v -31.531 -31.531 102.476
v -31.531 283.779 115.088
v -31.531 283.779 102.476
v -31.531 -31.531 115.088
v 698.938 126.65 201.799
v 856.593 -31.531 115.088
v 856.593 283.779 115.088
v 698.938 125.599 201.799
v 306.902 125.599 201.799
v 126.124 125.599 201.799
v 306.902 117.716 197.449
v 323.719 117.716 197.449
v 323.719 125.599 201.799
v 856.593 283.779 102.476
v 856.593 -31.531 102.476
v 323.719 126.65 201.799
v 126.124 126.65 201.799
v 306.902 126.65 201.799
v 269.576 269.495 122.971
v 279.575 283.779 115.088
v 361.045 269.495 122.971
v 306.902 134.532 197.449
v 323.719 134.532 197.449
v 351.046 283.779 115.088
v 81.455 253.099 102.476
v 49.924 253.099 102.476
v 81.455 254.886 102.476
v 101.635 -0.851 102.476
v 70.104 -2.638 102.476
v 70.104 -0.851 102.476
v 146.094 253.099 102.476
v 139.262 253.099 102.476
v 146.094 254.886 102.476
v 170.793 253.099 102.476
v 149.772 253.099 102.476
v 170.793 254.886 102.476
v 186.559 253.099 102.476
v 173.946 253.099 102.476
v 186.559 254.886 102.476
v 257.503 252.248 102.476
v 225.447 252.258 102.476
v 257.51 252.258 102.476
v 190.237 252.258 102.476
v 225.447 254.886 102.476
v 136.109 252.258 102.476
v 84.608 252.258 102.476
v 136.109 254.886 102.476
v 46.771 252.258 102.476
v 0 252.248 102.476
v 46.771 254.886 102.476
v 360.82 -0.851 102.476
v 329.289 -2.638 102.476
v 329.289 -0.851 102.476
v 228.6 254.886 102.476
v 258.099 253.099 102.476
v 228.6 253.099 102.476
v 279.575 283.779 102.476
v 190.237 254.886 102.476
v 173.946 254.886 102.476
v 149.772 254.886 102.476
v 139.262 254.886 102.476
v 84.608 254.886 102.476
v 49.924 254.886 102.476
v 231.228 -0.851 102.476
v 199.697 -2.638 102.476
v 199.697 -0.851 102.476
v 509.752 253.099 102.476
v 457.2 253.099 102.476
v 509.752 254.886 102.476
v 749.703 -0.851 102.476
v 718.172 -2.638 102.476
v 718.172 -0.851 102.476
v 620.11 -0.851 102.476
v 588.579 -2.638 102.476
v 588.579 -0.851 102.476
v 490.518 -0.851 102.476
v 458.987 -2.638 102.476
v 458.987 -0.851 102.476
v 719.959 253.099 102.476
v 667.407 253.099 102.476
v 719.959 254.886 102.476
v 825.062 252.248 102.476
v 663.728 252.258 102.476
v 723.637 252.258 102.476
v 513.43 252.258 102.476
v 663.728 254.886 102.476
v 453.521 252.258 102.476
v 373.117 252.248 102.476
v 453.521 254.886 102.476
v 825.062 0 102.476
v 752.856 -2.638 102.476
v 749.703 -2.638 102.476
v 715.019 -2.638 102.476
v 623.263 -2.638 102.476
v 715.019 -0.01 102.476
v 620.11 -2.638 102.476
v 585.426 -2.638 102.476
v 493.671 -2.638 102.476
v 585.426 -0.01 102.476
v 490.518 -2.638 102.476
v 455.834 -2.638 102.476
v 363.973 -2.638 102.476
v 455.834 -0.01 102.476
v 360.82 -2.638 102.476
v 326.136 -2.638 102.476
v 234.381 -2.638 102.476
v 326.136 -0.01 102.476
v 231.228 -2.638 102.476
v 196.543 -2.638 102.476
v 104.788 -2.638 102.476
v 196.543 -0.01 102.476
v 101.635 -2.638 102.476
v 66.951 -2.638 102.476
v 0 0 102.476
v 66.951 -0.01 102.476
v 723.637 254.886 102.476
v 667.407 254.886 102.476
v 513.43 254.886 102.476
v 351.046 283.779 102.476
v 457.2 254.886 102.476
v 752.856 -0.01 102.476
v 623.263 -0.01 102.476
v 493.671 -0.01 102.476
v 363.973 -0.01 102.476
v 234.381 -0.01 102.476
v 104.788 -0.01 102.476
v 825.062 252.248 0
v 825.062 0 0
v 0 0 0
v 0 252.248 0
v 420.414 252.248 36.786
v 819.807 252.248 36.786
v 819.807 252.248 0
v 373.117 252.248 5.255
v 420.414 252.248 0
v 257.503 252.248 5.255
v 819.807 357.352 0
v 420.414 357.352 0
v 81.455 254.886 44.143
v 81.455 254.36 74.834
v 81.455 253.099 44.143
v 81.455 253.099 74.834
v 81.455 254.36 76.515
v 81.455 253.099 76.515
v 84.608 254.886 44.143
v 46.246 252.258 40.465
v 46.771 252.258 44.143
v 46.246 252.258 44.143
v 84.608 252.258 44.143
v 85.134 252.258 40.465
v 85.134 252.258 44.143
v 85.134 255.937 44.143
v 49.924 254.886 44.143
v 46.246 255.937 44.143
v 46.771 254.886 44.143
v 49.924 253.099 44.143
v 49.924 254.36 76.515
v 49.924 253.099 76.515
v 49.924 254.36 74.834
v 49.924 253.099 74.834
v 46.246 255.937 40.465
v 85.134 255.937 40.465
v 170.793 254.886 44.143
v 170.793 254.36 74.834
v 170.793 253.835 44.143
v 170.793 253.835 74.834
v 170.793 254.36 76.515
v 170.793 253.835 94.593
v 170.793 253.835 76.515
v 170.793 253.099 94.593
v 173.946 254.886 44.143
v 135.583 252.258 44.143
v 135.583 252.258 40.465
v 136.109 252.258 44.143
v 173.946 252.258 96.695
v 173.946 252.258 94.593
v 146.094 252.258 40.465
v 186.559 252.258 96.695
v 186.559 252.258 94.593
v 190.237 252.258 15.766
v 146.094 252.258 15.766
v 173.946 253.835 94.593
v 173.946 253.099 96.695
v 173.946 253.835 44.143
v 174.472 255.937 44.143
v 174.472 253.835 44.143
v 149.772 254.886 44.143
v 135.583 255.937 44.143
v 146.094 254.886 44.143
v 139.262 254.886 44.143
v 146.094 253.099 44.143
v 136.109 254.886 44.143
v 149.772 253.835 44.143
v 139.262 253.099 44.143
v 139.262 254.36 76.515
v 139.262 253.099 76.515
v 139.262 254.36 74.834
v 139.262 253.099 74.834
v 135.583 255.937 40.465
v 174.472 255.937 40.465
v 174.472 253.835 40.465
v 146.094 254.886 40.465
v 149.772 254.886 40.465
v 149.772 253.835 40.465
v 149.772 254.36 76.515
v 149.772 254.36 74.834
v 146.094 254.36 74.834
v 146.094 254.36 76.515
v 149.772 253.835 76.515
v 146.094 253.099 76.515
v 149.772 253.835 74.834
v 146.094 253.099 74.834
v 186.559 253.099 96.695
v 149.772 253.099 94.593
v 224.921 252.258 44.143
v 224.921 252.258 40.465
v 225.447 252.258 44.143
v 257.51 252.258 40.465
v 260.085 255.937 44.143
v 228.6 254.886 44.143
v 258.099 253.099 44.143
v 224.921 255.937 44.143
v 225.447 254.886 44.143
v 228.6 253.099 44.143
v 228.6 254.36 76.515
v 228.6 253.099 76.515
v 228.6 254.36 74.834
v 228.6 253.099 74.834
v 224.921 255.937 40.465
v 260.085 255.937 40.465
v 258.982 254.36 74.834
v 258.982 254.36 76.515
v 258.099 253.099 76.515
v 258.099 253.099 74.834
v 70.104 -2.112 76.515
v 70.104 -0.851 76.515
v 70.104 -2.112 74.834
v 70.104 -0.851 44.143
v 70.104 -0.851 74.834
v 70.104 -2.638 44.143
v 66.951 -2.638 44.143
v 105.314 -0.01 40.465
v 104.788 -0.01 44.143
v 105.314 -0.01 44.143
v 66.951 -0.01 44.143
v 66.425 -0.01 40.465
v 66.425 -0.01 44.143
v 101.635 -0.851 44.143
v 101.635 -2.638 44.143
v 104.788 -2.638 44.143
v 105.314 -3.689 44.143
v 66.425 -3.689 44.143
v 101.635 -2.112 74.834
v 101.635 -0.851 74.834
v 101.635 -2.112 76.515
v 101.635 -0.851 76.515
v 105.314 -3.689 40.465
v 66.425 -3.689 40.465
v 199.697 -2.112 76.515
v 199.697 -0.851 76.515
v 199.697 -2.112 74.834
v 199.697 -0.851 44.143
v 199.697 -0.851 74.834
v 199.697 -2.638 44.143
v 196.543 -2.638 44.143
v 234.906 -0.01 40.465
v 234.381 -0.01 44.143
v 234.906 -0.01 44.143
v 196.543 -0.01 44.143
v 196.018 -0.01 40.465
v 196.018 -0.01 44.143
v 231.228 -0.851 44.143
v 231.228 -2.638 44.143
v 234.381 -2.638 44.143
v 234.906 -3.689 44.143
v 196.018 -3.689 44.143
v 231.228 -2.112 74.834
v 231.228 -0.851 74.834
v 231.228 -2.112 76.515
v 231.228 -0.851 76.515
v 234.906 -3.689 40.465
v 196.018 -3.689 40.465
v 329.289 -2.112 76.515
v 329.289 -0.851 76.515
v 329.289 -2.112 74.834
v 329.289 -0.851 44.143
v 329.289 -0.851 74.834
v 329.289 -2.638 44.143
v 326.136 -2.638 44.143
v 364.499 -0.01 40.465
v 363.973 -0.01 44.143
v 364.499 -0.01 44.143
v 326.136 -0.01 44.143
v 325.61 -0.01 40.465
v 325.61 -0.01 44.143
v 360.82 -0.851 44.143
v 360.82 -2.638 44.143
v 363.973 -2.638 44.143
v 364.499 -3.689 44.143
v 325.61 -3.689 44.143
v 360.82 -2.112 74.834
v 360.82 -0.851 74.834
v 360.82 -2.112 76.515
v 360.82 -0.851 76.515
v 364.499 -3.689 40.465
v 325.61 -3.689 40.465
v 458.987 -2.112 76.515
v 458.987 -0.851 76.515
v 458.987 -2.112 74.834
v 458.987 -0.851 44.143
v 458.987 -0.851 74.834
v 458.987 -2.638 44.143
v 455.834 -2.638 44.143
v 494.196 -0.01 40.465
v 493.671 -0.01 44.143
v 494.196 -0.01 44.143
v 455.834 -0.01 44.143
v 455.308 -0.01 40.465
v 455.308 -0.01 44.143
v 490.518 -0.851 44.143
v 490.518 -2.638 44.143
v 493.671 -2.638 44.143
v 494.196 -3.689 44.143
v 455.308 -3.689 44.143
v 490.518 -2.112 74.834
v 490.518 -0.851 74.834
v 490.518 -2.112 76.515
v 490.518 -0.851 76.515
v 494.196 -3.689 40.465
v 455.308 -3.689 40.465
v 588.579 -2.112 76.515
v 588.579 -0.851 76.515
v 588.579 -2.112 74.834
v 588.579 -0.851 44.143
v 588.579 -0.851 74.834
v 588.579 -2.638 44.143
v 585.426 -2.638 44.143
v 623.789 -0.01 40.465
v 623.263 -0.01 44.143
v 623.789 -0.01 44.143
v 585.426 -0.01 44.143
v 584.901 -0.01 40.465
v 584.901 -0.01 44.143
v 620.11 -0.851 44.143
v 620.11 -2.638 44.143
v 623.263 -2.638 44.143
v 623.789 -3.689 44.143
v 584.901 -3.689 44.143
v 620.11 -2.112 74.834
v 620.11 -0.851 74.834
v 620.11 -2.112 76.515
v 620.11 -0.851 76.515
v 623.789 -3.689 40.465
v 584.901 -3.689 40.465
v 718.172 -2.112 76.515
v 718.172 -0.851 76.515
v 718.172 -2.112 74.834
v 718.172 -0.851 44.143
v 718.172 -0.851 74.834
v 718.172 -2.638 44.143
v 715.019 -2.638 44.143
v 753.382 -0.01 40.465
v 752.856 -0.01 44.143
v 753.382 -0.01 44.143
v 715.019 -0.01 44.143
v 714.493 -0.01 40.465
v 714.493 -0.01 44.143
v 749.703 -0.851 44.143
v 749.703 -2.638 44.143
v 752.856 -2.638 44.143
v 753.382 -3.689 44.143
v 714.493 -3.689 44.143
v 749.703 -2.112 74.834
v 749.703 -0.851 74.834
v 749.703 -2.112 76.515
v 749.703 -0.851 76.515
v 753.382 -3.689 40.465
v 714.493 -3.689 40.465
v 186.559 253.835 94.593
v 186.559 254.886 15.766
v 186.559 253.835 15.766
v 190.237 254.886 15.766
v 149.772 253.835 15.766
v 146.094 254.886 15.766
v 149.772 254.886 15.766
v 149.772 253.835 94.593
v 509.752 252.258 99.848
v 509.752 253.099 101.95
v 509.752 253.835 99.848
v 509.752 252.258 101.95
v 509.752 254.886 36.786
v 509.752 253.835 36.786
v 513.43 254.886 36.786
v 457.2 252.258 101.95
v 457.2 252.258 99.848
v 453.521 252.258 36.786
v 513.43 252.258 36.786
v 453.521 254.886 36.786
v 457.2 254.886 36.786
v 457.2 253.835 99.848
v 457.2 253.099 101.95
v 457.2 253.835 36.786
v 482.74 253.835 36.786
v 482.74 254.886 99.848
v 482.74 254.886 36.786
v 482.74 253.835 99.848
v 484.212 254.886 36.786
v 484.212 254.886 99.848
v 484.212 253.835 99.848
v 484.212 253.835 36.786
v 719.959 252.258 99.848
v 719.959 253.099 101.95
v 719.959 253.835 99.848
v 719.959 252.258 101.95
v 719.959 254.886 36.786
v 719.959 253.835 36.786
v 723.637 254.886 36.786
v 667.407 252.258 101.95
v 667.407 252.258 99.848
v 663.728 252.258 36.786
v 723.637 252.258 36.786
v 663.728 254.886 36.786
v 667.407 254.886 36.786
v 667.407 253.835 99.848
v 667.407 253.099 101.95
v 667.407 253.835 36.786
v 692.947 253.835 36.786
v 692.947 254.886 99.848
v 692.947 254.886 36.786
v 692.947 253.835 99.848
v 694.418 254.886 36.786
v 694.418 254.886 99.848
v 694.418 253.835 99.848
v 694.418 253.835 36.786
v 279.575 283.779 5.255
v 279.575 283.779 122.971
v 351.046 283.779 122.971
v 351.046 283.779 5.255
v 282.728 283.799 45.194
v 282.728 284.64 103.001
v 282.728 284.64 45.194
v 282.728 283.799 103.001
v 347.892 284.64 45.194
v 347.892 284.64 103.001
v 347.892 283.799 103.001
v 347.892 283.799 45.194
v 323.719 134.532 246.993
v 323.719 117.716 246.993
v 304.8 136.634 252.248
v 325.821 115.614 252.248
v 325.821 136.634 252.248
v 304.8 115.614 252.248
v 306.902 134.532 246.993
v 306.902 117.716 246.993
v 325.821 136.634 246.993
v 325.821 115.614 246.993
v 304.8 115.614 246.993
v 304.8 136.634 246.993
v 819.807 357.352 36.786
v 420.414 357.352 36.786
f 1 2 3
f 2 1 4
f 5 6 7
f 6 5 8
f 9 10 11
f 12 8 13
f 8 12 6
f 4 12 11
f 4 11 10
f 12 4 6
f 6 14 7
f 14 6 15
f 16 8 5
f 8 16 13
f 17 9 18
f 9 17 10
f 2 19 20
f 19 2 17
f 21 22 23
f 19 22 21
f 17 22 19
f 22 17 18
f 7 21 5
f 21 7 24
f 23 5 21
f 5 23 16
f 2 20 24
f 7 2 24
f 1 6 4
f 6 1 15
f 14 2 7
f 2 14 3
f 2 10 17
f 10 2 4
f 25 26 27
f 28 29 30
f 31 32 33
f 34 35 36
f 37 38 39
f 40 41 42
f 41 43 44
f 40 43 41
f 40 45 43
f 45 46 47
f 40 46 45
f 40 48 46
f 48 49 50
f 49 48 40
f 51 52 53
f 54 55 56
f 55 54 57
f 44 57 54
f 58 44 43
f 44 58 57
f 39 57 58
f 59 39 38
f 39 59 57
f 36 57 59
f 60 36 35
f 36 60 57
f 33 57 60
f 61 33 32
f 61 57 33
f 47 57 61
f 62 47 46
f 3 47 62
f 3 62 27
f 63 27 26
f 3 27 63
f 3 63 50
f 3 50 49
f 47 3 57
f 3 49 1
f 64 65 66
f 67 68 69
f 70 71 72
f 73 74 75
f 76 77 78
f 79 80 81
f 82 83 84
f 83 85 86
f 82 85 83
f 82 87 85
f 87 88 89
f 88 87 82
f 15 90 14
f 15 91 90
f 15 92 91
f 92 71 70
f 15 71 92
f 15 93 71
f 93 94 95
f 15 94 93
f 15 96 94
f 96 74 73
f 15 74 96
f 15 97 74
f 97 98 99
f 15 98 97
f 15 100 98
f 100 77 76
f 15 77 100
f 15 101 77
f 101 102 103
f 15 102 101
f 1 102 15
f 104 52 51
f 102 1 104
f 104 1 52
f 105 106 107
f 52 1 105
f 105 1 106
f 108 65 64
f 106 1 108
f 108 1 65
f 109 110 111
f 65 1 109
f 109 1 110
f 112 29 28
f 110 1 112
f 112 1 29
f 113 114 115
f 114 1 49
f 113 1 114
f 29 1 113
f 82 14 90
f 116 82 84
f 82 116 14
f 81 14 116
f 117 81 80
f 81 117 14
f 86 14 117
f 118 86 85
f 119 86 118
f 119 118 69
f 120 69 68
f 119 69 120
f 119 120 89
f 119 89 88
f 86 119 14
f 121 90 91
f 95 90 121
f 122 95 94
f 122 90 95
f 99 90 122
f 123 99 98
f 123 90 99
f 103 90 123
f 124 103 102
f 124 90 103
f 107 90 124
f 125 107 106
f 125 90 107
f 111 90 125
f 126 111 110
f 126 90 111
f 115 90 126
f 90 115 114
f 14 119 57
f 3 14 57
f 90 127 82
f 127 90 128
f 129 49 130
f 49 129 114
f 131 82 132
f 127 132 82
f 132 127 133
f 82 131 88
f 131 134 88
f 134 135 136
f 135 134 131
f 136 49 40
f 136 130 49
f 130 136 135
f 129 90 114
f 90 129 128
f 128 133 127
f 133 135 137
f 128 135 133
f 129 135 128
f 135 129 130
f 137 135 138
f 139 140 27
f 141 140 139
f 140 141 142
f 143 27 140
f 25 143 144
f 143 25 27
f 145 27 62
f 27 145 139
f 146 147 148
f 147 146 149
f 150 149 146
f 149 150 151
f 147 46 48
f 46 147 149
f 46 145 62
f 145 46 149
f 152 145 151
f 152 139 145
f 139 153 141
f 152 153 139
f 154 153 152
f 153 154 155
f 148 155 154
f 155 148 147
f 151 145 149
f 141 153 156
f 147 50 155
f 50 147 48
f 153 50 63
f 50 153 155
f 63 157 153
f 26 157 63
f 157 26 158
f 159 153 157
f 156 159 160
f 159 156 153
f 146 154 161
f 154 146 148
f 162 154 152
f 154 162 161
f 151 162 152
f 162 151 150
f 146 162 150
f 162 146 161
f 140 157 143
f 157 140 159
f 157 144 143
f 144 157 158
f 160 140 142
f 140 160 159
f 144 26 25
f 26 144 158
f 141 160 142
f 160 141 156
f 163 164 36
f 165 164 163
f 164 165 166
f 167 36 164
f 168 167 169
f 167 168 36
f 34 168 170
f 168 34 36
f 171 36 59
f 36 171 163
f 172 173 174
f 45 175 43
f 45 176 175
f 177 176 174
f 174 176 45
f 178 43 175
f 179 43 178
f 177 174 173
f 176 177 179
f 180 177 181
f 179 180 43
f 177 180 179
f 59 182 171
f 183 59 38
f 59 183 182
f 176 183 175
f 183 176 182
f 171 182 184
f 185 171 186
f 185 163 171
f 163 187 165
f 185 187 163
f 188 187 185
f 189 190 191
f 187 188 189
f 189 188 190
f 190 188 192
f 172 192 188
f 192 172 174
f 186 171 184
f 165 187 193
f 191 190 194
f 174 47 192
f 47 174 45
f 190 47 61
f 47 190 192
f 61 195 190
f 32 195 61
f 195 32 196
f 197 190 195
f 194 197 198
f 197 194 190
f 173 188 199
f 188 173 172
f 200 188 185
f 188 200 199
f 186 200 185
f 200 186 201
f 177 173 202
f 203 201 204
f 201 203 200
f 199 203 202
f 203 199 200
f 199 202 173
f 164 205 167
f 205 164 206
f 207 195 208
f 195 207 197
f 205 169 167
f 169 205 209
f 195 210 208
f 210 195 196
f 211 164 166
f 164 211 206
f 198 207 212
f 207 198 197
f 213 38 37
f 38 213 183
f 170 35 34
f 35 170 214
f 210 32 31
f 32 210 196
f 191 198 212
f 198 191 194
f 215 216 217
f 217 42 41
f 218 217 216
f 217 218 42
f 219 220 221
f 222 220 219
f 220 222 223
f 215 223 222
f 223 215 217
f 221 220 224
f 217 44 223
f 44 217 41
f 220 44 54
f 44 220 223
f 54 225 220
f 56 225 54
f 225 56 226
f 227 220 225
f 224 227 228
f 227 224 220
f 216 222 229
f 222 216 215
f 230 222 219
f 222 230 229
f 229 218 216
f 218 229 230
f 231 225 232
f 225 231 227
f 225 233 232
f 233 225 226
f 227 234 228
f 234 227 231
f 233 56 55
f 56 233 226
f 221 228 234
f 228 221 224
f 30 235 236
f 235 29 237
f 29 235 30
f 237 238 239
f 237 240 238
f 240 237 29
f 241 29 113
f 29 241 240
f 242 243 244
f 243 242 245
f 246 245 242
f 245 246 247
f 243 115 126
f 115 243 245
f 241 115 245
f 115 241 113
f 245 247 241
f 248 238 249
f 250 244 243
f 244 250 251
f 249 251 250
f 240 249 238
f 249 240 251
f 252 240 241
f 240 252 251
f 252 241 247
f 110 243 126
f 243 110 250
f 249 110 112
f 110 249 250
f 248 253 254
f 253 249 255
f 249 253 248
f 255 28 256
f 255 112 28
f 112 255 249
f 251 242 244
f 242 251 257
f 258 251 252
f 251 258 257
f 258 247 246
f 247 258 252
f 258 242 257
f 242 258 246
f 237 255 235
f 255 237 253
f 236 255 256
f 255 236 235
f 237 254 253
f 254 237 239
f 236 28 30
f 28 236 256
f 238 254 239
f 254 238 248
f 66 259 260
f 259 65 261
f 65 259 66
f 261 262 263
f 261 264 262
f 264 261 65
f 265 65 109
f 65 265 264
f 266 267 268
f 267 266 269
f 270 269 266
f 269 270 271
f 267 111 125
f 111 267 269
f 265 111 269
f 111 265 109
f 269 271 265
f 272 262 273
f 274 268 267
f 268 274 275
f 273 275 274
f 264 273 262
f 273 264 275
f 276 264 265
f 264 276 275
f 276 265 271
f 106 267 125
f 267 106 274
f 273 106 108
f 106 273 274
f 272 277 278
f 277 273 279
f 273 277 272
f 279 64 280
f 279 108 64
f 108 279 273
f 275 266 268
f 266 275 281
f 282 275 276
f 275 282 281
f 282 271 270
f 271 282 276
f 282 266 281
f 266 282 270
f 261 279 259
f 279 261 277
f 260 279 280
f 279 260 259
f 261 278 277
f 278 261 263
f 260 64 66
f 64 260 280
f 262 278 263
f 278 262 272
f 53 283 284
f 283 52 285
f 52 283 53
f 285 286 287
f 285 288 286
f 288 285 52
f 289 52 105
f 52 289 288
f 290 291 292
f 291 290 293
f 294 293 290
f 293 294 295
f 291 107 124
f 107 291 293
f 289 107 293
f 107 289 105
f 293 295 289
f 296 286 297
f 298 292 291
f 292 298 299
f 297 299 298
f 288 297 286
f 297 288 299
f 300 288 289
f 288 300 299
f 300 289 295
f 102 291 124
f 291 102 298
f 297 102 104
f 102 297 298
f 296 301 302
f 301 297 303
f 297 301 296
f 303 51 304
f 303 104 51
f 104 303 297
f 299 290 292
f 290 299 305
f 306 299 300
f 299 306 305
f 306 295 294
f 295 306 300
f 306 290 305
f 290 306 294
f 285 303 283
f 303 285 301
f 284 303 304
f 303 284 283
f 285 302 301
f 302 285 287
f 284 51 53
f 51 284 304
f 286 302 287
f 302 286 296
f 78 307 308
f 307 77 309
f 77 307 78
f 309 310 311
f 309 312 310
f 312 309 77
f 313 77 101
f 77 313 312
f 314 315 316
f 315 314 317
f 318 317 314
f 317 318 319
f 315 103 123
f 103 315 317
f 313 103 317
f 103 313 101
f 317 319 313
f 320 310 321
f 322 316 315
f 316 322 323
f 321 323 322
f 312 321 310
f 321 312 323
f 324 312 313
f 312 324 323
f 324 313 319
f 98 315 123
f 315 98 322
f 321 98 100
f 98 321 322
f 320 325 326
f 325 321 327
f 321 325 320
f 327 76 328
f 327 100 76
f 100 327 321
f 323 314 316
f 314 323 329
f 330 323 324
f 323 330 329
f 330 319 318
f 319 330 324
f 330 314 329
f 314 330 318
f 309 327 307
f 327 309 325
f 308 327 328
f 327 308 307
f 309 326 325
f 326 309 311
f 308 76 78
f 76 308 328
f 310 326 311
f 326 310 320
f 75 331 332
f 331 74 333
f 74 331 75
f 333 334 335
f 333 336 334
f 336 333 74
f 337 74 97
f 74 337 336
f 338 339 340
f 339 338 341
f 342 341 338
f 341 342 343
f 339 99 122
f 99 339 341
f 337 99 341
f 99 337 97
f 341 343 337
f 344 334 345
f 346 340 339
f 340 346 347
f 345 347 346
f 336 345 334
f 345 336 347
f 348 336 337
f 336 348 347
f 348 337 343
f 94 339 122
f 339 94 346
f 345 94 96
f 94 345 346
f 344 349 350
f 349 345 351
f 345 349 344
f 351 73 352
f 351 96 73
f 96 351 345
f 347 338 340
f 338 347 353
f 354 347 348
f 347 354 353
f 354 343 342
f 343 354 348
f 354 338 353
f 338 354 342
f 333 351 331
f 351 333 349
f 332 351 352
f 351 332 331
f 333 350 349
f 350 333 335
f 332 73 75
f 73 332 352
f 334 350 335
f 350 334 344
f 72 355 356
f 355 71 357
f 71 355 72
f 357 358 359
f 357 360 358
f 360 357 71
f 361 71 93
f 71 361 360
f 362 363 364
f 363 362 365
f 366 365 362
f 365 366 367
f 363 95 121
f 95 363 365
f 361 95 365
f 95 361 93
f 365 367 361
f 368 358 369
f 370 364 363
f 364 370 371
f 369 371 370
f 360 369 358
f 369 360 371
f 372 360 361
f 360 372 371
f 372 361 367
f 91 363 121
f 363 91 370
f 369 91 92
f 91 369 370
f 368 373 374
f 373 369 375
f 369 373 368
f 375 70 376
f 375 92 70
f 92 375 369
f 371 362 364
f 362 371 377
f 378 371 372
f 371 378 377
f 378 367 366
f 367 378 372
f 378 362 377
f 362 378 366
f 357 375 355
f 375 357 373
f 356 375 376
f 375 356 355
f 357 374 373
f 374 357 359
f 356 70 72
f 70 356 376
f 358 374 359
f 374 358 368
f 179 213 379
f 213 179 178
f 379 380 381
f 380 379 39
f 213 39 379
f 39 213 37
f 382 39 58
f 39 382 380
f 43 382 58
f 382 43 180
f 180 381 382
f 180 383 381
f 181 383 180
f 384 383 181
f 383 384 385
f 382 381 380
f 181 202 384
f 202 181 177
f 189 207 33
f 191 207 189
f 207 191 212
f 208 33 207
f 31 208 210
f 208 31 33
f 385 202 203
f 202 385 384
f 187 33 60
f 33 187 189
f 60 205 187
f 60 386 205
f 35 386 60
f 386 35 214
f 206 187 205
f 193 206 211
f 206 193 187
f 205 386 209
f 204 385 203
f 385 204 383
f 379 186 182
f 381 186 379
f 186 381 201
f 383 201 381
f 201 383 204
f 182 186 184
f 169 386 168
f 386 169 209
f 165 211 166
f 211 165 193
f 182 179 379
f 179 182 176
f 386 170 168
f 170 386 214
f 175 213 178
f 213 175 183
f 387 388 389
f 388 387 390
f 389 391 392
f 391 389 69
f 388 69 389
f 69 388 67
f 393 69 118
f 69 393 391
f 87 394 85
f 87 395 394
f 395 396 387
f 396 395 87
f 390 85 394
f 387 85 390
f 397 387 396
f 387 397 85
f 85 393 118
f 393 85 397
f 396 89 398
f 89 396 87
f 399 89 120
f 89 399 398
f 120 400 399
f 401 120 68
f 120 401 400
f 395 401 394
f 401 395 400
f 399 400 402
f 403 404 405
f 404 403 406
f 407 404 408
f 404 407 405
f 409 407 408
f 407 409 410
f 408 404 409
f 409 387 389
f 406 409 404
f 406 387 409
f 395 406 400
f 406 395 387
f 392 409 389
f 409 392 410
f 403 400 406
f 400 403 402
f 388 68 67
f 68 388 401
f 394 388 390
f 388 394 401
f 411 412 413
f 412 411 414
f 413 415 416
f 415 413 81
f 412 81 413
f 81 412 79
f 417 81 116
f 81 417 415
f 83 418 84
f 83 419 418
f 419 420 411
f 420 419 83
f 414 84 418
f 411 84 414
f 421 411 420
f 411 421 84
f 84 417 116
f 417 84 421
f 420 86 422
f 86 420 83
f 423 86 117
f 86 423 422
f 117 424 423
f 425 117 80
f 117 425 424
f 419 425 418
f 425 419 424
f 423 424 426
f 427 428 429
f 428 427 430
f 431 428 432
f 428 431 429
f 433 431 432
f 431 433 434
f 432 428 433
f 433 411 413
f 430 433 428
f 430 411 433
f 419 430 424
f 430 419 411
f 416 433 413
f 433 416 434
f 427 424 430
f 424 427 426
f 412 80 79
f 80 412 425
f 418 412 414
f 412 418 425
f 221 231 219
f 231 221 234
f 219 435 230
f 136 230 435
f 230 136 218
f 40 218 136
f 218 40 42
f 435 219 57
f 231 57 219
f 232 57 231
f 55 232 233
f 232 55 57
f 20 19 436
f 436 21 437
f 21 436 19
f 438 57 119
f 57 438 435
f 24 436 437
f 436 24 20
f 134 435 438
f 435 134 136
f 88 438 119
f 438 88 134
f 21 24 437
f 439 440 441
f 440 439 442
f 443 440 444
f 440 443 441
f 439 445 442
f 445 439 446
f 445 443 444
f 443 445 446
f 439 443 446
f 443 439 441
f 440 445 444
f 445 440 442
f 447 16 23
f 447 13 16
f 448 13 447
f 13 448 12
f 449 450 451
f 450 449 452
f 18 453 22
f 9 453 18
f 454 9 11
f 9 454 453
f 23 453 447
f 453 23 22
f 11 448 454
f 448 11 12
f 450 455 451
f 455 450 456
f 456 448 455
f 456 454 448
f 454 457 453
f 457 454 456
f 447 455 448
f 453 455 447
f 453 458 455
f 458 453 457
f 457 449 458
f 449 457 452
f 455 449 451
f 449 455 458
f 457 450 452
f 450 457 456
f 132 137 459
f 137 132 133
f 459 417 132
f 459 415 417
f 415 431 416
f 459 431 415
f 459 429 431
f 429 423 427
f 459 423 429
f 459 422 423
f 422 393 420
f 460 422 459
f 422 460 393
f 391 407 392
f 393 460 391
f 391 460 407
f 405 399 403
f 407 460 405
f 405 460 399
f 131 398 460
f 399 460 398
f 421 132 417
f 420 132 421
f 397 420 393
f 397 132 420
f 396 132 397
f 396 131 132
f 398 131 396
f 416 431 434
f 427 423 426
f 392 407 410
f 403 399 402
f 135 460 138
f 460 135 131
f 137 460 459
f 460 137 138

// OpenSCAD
// =====================================================================
//  MILWAUKEE ROAD - MUSCODA, WIS. PASSENGER STATION
//  Source: Album sheet 118, drawing B-3261, July 26 1927.  Drawings are private reference (in copyright):
//  Research Library / RSW / Stations / Standard depots / Album of Depot Plans 1919.
//  Rib Side Works, 24 Nov 2026. FIRST SHAPE MODEL for review - not cut into print sections.
//  KNOWN (from the sheet): 78 ft 6 in x about 24 ft; waiting 20 x 23, ticket office 10 x 13 with bay, freight and baggage 32 ft 3 x 39?; high platforms; brick, hipped shingle roof.
//  ESTIMATE: wall and ridge heights where not written, window count and spacing, colours.
//  Built with the shared depot builder ../../../_common/rsw_depot.scad (x along the track,
//  y = 0 town side, track side +y, feet).  SCALE: 29 = G, 48 = O, 87 = HO.
// =====================================================================
SCALE = 29;
include <../../../_common/rsw_depot.scad>

depot(blocks = [[0, 78.5, 0, 24, 12, 0.55, 0, 3, 2]],
      pavs   = [],
      wins   = [[6.25, 1, 3, 6, 4.2], [14.75, 1, 3, 6, 4.2], [23.25, 1, 3, 6, 4.2], [31.75, 1, 3, 6, 4.2], [8.17, 0, 3, 6, 4.2], [20.5, 0, 3, 6, 4.2], [32.83, 0, 3, 6, 4.2], [45.17, 0, 3, 6, 4.2], [57.5, 0, 3, 6, 4.2], [69.83, 0, 3, 6, 4.2]],
      doors  = [[16, 1, 3.5, 7.5, 0], [46, 1, 5, 8, 1], [66, 1, 5, 8, 1]],
      bays   = [[30, 1, 11, 3]],
      chims  = [[30, 12, 24]],
      plat   = [40, 38, 10, 3.5]);
